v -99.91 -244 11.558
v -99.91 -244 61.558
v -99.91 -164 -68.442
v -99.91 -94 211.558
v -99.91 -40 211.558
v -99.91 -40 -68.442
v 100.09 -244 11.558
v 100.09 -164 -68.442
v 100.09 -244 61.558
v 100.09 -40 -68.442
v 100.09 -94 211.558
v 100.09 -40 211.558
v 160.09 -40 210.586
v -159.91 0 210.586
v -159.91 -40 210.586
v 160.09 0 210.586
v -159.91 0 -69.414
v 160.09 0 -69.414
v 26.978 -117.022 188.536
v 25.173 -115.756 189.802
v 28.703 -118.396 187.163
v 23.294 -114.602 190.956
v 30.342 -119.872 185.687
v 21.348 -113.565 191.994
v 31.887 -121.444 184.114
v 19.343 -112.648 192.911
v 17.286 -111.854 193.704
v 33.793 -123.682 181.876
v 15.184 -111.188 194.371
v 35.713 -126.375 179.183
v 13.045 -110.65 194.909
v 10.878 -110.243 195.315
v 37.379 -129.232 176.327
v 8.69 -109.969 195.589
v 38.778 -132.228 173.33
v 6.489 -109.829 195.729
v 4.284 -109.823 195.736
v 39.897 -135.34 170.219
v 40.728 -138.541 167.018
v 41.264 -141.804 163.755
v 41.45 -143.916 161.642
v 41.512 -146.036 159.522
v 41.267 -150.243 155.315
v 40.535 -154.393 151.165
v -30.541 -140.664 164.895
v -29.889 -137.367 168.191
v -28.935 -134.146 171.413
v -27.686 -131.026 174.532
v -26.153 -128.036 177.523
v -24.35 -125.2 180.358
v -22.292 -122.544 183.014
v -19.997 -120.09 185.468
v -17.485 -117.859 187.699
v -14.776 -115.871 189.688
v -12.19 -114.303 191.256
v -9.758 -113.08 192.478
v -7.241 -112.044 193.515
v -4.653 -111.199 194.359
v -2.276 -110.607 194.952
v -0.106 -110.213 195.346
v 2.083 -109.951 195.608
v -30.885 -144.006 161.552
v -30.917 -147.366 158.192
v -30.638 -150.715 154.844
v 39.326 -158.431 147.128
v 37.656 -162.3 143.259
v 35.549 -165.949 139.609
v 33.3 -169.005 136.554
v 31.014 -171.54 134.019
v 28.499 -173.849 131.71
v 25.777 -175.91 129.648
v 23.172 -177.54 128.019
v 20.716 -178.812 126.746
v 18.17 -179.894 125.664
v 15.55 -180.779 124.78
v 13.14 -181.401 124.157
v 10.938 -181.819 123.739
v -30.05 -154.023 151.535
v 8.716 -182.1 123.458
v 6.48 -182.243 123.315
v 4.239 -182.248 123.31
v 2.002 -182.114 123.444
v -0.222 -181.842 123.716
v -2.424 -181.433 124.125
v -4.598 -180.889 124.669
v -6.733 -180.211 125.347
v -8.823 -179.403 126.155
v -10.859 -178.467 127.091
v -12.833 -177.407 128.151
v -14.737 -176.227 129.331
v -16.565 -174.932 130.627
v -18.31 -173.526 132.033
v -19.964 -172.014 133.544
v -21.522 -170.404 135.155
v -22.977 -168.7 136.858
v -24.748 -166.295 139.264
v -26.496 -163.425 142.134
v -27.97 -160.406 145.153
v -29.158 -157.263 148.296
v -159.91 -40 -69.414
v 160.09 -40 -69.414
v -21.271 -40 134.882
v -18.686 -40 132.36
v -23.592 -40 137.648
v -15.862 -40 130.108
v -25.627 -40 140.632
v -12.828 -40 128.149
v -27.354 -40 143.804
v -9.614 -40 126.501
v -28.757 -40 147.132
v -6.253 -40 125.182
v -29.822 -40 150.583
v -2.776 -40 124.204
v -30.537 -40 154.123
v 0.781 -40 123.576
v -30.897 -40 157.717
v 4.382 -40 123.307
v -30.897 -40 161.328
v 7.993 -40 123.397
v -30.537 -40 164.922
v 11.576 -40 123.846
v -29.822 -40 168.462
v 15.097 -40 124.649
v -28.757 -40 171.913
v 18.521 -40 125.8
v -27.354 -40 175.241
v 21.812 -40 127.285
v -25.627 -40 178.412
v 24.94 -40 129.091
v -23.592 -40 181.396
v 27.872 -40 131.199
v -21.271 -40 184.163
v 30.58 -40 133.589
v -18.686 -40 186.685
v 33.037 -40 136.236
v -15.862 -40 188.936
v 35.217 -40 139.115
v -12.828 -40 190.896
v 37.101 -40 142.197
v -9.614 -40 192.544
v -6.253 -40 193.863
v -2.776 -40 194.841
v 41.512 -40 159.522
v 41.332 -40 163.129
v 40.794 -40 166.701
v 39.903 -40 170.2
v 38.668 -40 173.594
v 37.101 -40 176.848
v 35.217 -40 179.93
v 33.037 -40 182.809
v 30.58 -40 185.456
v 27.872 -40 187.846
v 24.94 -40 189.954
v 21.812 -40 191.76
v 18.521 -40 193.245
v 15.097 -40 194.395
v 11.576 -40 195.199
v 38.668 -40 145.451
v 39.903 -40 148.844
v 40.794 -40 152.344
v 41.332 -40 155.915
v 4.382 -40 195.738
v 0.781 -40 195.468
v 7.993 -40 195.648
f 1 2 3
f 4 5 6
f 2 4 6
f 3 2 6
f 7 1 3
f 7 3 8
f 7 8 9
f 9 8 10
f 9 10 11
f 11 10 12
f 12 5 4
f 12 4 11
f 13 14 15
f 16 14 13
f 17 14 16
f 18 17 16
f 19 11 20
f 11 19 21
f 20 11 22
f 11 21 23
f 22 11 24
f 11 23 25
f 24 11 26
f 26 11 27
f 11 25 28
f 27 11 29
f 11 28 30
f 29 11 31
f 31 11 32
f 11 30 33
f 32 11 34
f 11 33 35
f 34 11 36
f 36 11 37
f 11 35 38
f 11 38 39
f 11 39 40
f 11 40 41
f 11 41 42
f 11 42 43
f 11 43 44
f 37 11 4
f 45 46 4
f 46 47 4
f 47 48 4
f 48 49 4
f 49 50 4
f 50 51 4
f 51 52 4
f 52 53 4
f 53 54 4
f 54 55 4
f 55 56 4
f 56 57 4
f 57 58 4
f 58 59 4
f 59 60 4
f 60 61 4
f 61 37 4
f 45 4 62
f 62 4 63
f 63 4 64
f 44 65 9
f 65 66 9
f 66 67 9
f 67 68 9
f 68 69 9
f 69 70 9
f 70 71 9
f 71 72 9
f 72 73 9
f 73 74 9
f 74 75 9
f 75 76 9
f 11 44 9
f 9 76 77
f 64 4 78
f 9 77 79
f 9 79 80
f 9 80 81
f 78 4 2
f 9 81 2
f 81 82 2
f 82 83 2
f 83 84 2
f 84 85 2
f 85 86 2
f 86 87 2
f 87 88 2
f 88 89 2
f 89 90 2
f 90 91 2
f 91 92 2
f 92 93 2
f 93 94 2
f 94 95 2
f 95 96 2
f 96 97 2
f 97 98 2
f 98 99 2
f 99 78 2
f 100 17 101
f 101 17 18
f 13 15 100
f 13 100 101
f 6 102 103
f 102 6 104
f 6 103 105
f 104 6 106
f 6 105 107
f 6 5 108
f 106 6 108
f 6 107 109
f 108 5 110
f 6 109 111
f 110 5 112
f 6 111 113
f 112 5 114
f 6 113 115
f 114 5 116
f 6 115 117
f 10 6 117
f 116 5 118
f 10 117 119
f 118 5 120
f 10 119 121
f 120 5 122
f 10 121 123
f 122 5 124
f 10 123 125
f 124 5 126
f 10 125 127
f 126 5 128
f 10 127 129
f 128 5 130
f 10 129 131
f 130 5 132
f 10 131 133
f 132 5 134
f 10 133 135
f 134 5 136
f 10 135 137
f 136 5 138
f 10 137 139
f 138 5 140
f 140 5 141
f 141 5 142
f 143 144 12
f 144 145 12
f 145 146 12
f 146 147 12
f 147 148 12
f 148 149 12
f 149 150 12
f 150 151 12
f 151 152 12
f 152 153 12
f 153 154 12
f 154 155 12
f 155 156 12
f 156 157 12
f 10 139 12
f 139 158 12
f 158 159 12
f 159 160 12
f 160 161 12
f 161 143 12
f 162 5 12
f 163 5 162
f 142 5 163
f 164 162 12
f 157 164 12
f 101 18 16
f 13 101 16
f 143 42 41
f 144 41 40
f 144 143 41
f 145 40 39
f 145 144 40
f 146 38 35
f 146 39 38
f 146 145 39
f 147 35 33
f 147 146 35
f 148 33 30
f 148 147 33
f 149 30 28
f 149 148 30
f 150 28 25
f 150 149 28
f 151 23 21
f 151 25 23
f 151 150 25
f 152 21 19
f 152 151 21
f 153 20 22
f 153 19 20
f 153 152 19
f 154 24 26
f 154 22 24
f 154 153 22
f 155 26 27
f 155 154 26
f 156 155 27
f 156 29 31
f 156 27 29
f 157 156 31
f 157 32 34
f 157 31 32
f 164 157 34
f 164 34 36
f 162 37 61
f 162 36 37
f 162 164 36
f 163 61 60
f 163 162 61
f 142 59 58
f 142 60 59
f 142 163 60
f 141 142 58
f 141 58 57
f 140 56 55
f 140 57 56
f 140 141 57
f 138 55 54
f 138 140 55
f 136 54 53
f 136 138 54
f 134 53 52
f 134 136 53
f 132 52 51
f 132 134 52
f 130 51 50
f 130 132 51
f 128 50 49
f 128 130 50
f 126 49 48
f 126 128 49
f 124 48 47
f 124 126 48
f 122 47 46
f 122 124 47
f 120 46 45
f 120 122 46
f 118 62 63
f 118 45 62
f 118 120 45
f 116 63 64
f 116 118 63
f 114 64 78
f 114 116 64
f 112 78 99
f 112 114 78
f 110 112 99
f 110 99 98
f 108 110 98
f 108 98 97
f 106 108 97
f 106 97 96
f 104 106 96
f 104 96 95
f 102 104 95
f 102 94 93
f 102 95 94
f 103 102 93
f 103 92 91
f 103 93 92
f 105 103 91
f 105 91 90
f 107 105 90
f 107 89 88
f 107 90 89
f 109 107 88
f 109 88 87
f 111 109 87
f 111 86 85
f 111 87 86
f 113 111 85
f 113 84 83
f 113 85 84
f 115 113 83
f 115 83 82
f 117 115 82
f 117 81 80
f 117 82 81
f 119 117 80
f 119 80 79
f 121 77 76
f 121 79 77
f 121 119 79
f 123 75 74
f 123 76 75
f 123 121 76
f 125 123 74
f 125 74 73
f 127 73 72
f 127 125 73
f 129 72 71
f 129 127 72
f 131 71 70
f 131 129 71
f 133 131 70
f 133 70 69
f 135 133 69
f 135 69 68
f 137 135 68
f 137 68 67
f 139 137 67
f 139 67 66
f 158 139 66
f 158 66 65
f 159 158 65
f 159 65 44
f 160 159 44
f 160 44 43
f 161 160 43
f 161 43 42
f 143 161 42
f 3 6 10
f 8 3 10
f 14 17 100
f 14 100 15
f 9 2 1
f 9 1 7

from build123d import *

# Parameters (mm, degrees)
F0_W        = 320
F0_H        = 280
F1_DEPTH    = 40
F2_W        = 200
F2_H        = 0.9724124948
F2_H_2      = 279.0275875052
F2_R        = 36.2270476268
F3_DEPTH    = 204
F4_T1_DEPTH = 971.5048963898
F5_SIZE     = 80


# Not quite as in the source:
# - a fillet or chamfer that OpenCascade refuses, or shapes differently, is made with other operations: its cross-section is extruded or revolved along the edge and cut away or added
# - a feature of the source that left no trace in its solid (it failed there, or was rolled back) is left out


with BuildPart() as f1:
    # F0 (on Front) → F1 (new body)
    with BuildSketch(Plane.XZ):
        with Locations((0.0898987055, 70.5860536863)):
            Rectangle(F0_W, F0_H)
    extrude(amount=F1_DEPTH)


with BuildPart() as f3:
    # F2 (on face) → F3 (new body)
    with BuildSketch(Plane.XZ.offset(40)):
        with Locations((0.0898987055, 211.0722599337)):
            Rectangle(F2_W, F2_H)
        with Locations((0.0898987055, 71.0722599337)):
            Rectangle(F2_W, F2_H_2)
        with Locations((5.2852756344, 159.5223546028)):
            Circle(F2_R, mode=Mode.SUBTRACT)
    extrude(amount=F3_DEPTH)

    # F4: chamfer of 150 on 1 edges, made by hand

    # F4_s2 → F4_t1 (cut)
    with BuildSketch(Plane.YZ.offset(-485.6625494894)):
        Polygon((-94, 211.5584661812), (-244, 61.5584661812), (-244, 211.5584661812), align=None)
    extrude(amount=F4_T1_DEPTH, mode=Mode.SUBTRACT)

    # F5
    f5_edges = [f3.edges().sort_by_distance(p)[0] for p in [
        (0.089899, -244, -68.441534),
    ]]
    chamfer(f5_edges, length=F5_SIZE)


solid = Compound([f1.part, f3.part])
